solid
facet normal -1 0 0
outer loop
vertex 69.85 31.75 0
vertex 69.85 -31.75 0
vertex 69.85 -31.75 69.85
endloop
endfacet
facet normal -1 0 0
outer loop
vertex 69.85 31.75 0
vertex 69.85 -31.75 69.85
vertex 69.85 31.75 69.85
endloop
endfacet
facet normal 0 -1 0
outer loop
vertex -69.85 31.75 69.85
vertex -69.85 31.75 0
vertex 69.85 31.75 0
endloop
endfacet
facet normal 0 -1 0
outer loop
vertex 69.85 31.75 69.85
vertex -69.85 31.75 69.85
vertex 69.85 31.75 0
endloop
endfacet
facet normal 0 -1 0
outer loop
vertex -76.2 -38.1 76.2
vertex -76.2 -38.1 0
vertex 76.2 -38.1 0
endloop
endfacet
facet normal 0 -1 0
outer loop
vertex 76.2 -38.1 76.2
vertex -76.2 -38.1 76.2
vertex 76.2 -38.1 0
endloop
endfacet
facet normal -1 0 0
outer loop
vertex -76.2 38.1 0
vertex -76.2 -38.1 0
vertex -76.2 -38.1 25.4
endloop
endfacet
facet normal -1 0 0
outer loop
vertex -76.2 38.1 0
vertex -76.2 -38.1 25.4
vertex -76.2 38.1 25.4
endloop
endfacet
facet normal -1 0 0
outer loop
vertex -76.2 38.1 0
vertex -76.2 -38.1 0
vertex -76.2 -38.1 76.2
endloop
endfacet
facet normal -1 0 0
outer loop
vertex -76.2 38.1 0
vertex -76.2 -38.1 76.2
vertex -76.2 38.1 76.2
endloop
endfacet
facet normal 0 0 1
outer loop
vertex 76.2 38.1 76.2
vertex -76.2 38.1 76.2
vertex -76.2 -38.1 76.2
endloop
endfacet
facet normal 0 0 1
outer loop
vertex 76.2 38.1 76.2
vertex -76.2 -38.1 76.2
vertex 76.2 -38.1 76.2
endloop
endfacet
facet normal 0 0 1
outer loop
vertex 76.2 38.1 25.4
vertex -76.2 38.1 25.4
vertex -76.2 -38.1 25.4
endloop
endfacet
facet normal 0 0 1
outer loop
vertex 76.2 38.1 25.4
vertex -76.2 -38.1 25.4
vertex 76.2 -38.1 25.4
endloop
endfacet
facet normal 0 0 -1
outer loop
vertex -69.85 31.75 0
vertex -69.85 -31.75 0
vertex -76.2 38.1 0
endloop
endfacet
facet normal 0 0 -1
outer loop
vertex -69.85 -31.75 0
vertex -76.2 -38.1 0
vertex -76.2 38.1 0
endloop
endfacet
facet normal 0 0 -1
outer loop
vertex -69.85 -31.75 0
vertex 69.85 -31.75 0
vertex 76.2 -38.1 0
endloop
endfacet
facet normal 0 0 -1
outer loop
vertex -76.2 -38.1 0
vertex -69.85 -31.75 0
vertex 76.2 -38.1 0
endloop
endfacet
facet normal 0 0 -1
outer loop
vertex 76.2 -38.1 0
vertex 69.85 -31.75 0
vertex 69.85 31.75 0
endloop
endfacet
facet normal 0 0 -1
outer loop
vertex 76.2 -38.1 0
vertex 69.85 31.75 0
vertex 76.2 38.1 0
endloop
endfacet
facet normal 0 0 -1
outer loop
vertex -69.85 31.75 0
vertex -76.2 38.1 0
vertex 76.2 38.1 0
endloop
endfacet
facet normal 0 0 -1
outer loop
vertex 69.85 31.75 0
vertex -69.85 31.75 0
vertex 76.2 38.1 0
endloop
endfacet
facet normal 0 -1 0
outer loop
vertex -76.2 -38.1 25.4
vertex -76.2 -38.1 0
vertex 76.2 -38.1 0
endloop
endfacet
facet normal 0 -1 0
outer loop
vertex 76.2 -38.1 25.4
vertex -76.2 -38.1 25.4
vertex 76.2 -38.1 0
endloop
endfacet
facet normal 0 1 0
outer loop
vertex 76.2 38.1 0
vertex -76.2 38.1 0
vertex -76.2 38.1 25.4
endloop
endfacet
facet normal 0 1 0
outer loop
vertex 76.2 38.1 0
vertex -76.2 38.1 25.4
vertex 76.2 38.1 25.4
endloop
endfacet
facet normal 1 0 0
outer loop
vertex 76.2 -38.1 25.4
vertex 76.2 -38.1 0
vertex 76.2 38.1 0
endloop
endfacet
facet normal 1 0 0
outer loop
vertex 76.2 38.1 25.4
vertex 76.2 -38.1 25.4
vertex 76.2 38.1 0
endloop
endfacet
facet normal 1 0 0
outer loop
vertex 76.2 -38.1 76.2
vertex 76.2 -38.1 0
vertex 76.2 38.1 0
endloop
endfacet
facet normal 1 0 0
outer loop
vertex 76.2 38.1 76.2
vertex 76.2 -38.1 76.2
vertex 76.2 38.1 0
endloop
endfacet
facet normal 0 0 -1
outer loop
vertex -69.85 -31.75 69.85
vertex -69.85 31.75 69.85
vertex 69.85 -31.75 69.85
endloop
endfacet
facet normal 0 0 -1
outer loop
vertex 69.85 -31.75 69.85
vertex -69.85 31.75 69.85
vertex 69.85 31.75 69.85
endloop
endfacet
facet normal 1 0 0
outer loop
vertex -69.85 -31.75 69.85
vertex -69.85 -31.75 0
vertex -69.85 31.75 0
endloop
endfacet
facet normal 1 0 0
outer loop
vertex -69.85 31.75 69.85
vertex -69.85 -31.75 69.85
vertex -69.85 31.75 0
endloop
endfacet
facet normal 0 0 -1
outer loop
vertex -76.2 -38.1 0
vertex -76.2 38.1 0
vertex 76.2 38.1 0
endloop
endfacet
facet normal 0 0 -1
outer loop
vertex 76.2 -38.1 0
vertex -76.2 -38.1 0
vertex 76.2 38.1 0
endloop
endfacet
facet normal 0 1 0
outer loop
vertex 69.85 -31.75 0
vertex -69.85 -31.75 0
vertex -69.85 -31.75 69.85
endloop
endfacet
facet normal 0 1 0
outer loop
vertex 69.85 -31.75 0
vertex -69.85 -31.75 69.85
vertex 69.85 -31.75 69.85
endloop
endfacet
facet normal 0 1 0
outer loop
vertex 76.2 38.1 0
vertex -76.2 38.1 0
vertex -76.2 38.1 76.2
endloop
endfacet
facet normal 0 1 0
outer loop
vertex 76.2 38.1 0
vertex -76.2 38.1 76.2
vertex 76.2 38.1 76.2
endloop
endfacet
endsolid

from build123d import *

# Parameters (mm, degrees)
F0_W     = 152.4
F0_H     = 76.2
F1_DEPTH = 76.2
F2_T     = -6.35
F3_W     = 152.4
F3_H     = 76.2
F4_DEPTH = 25.4


with BuildPart() as f1:
    # F0 (on Top) → F1 (new body)
    with BuildSketch(Plane.XY):
        Rectangle(F0_W, F0_H)
    extrude(amount=F1_DEPTH)

    # F2
    f2_openings = [f1.faces().sort_by_distance(p)[0] for p in [
        (0, 0, 0),
    ]]
    offset(amount=F2_T, openings=f2_openings)


with BuildPart() as f4:
    # F3 (on Top) → F4 (new body)
    with BuildSketch(Plane.XY):
        Rectangle(F3_W, F3_H)
    extrude(amount=F4_DEPTH)


solid = Compound([f1.part, f4.part])
